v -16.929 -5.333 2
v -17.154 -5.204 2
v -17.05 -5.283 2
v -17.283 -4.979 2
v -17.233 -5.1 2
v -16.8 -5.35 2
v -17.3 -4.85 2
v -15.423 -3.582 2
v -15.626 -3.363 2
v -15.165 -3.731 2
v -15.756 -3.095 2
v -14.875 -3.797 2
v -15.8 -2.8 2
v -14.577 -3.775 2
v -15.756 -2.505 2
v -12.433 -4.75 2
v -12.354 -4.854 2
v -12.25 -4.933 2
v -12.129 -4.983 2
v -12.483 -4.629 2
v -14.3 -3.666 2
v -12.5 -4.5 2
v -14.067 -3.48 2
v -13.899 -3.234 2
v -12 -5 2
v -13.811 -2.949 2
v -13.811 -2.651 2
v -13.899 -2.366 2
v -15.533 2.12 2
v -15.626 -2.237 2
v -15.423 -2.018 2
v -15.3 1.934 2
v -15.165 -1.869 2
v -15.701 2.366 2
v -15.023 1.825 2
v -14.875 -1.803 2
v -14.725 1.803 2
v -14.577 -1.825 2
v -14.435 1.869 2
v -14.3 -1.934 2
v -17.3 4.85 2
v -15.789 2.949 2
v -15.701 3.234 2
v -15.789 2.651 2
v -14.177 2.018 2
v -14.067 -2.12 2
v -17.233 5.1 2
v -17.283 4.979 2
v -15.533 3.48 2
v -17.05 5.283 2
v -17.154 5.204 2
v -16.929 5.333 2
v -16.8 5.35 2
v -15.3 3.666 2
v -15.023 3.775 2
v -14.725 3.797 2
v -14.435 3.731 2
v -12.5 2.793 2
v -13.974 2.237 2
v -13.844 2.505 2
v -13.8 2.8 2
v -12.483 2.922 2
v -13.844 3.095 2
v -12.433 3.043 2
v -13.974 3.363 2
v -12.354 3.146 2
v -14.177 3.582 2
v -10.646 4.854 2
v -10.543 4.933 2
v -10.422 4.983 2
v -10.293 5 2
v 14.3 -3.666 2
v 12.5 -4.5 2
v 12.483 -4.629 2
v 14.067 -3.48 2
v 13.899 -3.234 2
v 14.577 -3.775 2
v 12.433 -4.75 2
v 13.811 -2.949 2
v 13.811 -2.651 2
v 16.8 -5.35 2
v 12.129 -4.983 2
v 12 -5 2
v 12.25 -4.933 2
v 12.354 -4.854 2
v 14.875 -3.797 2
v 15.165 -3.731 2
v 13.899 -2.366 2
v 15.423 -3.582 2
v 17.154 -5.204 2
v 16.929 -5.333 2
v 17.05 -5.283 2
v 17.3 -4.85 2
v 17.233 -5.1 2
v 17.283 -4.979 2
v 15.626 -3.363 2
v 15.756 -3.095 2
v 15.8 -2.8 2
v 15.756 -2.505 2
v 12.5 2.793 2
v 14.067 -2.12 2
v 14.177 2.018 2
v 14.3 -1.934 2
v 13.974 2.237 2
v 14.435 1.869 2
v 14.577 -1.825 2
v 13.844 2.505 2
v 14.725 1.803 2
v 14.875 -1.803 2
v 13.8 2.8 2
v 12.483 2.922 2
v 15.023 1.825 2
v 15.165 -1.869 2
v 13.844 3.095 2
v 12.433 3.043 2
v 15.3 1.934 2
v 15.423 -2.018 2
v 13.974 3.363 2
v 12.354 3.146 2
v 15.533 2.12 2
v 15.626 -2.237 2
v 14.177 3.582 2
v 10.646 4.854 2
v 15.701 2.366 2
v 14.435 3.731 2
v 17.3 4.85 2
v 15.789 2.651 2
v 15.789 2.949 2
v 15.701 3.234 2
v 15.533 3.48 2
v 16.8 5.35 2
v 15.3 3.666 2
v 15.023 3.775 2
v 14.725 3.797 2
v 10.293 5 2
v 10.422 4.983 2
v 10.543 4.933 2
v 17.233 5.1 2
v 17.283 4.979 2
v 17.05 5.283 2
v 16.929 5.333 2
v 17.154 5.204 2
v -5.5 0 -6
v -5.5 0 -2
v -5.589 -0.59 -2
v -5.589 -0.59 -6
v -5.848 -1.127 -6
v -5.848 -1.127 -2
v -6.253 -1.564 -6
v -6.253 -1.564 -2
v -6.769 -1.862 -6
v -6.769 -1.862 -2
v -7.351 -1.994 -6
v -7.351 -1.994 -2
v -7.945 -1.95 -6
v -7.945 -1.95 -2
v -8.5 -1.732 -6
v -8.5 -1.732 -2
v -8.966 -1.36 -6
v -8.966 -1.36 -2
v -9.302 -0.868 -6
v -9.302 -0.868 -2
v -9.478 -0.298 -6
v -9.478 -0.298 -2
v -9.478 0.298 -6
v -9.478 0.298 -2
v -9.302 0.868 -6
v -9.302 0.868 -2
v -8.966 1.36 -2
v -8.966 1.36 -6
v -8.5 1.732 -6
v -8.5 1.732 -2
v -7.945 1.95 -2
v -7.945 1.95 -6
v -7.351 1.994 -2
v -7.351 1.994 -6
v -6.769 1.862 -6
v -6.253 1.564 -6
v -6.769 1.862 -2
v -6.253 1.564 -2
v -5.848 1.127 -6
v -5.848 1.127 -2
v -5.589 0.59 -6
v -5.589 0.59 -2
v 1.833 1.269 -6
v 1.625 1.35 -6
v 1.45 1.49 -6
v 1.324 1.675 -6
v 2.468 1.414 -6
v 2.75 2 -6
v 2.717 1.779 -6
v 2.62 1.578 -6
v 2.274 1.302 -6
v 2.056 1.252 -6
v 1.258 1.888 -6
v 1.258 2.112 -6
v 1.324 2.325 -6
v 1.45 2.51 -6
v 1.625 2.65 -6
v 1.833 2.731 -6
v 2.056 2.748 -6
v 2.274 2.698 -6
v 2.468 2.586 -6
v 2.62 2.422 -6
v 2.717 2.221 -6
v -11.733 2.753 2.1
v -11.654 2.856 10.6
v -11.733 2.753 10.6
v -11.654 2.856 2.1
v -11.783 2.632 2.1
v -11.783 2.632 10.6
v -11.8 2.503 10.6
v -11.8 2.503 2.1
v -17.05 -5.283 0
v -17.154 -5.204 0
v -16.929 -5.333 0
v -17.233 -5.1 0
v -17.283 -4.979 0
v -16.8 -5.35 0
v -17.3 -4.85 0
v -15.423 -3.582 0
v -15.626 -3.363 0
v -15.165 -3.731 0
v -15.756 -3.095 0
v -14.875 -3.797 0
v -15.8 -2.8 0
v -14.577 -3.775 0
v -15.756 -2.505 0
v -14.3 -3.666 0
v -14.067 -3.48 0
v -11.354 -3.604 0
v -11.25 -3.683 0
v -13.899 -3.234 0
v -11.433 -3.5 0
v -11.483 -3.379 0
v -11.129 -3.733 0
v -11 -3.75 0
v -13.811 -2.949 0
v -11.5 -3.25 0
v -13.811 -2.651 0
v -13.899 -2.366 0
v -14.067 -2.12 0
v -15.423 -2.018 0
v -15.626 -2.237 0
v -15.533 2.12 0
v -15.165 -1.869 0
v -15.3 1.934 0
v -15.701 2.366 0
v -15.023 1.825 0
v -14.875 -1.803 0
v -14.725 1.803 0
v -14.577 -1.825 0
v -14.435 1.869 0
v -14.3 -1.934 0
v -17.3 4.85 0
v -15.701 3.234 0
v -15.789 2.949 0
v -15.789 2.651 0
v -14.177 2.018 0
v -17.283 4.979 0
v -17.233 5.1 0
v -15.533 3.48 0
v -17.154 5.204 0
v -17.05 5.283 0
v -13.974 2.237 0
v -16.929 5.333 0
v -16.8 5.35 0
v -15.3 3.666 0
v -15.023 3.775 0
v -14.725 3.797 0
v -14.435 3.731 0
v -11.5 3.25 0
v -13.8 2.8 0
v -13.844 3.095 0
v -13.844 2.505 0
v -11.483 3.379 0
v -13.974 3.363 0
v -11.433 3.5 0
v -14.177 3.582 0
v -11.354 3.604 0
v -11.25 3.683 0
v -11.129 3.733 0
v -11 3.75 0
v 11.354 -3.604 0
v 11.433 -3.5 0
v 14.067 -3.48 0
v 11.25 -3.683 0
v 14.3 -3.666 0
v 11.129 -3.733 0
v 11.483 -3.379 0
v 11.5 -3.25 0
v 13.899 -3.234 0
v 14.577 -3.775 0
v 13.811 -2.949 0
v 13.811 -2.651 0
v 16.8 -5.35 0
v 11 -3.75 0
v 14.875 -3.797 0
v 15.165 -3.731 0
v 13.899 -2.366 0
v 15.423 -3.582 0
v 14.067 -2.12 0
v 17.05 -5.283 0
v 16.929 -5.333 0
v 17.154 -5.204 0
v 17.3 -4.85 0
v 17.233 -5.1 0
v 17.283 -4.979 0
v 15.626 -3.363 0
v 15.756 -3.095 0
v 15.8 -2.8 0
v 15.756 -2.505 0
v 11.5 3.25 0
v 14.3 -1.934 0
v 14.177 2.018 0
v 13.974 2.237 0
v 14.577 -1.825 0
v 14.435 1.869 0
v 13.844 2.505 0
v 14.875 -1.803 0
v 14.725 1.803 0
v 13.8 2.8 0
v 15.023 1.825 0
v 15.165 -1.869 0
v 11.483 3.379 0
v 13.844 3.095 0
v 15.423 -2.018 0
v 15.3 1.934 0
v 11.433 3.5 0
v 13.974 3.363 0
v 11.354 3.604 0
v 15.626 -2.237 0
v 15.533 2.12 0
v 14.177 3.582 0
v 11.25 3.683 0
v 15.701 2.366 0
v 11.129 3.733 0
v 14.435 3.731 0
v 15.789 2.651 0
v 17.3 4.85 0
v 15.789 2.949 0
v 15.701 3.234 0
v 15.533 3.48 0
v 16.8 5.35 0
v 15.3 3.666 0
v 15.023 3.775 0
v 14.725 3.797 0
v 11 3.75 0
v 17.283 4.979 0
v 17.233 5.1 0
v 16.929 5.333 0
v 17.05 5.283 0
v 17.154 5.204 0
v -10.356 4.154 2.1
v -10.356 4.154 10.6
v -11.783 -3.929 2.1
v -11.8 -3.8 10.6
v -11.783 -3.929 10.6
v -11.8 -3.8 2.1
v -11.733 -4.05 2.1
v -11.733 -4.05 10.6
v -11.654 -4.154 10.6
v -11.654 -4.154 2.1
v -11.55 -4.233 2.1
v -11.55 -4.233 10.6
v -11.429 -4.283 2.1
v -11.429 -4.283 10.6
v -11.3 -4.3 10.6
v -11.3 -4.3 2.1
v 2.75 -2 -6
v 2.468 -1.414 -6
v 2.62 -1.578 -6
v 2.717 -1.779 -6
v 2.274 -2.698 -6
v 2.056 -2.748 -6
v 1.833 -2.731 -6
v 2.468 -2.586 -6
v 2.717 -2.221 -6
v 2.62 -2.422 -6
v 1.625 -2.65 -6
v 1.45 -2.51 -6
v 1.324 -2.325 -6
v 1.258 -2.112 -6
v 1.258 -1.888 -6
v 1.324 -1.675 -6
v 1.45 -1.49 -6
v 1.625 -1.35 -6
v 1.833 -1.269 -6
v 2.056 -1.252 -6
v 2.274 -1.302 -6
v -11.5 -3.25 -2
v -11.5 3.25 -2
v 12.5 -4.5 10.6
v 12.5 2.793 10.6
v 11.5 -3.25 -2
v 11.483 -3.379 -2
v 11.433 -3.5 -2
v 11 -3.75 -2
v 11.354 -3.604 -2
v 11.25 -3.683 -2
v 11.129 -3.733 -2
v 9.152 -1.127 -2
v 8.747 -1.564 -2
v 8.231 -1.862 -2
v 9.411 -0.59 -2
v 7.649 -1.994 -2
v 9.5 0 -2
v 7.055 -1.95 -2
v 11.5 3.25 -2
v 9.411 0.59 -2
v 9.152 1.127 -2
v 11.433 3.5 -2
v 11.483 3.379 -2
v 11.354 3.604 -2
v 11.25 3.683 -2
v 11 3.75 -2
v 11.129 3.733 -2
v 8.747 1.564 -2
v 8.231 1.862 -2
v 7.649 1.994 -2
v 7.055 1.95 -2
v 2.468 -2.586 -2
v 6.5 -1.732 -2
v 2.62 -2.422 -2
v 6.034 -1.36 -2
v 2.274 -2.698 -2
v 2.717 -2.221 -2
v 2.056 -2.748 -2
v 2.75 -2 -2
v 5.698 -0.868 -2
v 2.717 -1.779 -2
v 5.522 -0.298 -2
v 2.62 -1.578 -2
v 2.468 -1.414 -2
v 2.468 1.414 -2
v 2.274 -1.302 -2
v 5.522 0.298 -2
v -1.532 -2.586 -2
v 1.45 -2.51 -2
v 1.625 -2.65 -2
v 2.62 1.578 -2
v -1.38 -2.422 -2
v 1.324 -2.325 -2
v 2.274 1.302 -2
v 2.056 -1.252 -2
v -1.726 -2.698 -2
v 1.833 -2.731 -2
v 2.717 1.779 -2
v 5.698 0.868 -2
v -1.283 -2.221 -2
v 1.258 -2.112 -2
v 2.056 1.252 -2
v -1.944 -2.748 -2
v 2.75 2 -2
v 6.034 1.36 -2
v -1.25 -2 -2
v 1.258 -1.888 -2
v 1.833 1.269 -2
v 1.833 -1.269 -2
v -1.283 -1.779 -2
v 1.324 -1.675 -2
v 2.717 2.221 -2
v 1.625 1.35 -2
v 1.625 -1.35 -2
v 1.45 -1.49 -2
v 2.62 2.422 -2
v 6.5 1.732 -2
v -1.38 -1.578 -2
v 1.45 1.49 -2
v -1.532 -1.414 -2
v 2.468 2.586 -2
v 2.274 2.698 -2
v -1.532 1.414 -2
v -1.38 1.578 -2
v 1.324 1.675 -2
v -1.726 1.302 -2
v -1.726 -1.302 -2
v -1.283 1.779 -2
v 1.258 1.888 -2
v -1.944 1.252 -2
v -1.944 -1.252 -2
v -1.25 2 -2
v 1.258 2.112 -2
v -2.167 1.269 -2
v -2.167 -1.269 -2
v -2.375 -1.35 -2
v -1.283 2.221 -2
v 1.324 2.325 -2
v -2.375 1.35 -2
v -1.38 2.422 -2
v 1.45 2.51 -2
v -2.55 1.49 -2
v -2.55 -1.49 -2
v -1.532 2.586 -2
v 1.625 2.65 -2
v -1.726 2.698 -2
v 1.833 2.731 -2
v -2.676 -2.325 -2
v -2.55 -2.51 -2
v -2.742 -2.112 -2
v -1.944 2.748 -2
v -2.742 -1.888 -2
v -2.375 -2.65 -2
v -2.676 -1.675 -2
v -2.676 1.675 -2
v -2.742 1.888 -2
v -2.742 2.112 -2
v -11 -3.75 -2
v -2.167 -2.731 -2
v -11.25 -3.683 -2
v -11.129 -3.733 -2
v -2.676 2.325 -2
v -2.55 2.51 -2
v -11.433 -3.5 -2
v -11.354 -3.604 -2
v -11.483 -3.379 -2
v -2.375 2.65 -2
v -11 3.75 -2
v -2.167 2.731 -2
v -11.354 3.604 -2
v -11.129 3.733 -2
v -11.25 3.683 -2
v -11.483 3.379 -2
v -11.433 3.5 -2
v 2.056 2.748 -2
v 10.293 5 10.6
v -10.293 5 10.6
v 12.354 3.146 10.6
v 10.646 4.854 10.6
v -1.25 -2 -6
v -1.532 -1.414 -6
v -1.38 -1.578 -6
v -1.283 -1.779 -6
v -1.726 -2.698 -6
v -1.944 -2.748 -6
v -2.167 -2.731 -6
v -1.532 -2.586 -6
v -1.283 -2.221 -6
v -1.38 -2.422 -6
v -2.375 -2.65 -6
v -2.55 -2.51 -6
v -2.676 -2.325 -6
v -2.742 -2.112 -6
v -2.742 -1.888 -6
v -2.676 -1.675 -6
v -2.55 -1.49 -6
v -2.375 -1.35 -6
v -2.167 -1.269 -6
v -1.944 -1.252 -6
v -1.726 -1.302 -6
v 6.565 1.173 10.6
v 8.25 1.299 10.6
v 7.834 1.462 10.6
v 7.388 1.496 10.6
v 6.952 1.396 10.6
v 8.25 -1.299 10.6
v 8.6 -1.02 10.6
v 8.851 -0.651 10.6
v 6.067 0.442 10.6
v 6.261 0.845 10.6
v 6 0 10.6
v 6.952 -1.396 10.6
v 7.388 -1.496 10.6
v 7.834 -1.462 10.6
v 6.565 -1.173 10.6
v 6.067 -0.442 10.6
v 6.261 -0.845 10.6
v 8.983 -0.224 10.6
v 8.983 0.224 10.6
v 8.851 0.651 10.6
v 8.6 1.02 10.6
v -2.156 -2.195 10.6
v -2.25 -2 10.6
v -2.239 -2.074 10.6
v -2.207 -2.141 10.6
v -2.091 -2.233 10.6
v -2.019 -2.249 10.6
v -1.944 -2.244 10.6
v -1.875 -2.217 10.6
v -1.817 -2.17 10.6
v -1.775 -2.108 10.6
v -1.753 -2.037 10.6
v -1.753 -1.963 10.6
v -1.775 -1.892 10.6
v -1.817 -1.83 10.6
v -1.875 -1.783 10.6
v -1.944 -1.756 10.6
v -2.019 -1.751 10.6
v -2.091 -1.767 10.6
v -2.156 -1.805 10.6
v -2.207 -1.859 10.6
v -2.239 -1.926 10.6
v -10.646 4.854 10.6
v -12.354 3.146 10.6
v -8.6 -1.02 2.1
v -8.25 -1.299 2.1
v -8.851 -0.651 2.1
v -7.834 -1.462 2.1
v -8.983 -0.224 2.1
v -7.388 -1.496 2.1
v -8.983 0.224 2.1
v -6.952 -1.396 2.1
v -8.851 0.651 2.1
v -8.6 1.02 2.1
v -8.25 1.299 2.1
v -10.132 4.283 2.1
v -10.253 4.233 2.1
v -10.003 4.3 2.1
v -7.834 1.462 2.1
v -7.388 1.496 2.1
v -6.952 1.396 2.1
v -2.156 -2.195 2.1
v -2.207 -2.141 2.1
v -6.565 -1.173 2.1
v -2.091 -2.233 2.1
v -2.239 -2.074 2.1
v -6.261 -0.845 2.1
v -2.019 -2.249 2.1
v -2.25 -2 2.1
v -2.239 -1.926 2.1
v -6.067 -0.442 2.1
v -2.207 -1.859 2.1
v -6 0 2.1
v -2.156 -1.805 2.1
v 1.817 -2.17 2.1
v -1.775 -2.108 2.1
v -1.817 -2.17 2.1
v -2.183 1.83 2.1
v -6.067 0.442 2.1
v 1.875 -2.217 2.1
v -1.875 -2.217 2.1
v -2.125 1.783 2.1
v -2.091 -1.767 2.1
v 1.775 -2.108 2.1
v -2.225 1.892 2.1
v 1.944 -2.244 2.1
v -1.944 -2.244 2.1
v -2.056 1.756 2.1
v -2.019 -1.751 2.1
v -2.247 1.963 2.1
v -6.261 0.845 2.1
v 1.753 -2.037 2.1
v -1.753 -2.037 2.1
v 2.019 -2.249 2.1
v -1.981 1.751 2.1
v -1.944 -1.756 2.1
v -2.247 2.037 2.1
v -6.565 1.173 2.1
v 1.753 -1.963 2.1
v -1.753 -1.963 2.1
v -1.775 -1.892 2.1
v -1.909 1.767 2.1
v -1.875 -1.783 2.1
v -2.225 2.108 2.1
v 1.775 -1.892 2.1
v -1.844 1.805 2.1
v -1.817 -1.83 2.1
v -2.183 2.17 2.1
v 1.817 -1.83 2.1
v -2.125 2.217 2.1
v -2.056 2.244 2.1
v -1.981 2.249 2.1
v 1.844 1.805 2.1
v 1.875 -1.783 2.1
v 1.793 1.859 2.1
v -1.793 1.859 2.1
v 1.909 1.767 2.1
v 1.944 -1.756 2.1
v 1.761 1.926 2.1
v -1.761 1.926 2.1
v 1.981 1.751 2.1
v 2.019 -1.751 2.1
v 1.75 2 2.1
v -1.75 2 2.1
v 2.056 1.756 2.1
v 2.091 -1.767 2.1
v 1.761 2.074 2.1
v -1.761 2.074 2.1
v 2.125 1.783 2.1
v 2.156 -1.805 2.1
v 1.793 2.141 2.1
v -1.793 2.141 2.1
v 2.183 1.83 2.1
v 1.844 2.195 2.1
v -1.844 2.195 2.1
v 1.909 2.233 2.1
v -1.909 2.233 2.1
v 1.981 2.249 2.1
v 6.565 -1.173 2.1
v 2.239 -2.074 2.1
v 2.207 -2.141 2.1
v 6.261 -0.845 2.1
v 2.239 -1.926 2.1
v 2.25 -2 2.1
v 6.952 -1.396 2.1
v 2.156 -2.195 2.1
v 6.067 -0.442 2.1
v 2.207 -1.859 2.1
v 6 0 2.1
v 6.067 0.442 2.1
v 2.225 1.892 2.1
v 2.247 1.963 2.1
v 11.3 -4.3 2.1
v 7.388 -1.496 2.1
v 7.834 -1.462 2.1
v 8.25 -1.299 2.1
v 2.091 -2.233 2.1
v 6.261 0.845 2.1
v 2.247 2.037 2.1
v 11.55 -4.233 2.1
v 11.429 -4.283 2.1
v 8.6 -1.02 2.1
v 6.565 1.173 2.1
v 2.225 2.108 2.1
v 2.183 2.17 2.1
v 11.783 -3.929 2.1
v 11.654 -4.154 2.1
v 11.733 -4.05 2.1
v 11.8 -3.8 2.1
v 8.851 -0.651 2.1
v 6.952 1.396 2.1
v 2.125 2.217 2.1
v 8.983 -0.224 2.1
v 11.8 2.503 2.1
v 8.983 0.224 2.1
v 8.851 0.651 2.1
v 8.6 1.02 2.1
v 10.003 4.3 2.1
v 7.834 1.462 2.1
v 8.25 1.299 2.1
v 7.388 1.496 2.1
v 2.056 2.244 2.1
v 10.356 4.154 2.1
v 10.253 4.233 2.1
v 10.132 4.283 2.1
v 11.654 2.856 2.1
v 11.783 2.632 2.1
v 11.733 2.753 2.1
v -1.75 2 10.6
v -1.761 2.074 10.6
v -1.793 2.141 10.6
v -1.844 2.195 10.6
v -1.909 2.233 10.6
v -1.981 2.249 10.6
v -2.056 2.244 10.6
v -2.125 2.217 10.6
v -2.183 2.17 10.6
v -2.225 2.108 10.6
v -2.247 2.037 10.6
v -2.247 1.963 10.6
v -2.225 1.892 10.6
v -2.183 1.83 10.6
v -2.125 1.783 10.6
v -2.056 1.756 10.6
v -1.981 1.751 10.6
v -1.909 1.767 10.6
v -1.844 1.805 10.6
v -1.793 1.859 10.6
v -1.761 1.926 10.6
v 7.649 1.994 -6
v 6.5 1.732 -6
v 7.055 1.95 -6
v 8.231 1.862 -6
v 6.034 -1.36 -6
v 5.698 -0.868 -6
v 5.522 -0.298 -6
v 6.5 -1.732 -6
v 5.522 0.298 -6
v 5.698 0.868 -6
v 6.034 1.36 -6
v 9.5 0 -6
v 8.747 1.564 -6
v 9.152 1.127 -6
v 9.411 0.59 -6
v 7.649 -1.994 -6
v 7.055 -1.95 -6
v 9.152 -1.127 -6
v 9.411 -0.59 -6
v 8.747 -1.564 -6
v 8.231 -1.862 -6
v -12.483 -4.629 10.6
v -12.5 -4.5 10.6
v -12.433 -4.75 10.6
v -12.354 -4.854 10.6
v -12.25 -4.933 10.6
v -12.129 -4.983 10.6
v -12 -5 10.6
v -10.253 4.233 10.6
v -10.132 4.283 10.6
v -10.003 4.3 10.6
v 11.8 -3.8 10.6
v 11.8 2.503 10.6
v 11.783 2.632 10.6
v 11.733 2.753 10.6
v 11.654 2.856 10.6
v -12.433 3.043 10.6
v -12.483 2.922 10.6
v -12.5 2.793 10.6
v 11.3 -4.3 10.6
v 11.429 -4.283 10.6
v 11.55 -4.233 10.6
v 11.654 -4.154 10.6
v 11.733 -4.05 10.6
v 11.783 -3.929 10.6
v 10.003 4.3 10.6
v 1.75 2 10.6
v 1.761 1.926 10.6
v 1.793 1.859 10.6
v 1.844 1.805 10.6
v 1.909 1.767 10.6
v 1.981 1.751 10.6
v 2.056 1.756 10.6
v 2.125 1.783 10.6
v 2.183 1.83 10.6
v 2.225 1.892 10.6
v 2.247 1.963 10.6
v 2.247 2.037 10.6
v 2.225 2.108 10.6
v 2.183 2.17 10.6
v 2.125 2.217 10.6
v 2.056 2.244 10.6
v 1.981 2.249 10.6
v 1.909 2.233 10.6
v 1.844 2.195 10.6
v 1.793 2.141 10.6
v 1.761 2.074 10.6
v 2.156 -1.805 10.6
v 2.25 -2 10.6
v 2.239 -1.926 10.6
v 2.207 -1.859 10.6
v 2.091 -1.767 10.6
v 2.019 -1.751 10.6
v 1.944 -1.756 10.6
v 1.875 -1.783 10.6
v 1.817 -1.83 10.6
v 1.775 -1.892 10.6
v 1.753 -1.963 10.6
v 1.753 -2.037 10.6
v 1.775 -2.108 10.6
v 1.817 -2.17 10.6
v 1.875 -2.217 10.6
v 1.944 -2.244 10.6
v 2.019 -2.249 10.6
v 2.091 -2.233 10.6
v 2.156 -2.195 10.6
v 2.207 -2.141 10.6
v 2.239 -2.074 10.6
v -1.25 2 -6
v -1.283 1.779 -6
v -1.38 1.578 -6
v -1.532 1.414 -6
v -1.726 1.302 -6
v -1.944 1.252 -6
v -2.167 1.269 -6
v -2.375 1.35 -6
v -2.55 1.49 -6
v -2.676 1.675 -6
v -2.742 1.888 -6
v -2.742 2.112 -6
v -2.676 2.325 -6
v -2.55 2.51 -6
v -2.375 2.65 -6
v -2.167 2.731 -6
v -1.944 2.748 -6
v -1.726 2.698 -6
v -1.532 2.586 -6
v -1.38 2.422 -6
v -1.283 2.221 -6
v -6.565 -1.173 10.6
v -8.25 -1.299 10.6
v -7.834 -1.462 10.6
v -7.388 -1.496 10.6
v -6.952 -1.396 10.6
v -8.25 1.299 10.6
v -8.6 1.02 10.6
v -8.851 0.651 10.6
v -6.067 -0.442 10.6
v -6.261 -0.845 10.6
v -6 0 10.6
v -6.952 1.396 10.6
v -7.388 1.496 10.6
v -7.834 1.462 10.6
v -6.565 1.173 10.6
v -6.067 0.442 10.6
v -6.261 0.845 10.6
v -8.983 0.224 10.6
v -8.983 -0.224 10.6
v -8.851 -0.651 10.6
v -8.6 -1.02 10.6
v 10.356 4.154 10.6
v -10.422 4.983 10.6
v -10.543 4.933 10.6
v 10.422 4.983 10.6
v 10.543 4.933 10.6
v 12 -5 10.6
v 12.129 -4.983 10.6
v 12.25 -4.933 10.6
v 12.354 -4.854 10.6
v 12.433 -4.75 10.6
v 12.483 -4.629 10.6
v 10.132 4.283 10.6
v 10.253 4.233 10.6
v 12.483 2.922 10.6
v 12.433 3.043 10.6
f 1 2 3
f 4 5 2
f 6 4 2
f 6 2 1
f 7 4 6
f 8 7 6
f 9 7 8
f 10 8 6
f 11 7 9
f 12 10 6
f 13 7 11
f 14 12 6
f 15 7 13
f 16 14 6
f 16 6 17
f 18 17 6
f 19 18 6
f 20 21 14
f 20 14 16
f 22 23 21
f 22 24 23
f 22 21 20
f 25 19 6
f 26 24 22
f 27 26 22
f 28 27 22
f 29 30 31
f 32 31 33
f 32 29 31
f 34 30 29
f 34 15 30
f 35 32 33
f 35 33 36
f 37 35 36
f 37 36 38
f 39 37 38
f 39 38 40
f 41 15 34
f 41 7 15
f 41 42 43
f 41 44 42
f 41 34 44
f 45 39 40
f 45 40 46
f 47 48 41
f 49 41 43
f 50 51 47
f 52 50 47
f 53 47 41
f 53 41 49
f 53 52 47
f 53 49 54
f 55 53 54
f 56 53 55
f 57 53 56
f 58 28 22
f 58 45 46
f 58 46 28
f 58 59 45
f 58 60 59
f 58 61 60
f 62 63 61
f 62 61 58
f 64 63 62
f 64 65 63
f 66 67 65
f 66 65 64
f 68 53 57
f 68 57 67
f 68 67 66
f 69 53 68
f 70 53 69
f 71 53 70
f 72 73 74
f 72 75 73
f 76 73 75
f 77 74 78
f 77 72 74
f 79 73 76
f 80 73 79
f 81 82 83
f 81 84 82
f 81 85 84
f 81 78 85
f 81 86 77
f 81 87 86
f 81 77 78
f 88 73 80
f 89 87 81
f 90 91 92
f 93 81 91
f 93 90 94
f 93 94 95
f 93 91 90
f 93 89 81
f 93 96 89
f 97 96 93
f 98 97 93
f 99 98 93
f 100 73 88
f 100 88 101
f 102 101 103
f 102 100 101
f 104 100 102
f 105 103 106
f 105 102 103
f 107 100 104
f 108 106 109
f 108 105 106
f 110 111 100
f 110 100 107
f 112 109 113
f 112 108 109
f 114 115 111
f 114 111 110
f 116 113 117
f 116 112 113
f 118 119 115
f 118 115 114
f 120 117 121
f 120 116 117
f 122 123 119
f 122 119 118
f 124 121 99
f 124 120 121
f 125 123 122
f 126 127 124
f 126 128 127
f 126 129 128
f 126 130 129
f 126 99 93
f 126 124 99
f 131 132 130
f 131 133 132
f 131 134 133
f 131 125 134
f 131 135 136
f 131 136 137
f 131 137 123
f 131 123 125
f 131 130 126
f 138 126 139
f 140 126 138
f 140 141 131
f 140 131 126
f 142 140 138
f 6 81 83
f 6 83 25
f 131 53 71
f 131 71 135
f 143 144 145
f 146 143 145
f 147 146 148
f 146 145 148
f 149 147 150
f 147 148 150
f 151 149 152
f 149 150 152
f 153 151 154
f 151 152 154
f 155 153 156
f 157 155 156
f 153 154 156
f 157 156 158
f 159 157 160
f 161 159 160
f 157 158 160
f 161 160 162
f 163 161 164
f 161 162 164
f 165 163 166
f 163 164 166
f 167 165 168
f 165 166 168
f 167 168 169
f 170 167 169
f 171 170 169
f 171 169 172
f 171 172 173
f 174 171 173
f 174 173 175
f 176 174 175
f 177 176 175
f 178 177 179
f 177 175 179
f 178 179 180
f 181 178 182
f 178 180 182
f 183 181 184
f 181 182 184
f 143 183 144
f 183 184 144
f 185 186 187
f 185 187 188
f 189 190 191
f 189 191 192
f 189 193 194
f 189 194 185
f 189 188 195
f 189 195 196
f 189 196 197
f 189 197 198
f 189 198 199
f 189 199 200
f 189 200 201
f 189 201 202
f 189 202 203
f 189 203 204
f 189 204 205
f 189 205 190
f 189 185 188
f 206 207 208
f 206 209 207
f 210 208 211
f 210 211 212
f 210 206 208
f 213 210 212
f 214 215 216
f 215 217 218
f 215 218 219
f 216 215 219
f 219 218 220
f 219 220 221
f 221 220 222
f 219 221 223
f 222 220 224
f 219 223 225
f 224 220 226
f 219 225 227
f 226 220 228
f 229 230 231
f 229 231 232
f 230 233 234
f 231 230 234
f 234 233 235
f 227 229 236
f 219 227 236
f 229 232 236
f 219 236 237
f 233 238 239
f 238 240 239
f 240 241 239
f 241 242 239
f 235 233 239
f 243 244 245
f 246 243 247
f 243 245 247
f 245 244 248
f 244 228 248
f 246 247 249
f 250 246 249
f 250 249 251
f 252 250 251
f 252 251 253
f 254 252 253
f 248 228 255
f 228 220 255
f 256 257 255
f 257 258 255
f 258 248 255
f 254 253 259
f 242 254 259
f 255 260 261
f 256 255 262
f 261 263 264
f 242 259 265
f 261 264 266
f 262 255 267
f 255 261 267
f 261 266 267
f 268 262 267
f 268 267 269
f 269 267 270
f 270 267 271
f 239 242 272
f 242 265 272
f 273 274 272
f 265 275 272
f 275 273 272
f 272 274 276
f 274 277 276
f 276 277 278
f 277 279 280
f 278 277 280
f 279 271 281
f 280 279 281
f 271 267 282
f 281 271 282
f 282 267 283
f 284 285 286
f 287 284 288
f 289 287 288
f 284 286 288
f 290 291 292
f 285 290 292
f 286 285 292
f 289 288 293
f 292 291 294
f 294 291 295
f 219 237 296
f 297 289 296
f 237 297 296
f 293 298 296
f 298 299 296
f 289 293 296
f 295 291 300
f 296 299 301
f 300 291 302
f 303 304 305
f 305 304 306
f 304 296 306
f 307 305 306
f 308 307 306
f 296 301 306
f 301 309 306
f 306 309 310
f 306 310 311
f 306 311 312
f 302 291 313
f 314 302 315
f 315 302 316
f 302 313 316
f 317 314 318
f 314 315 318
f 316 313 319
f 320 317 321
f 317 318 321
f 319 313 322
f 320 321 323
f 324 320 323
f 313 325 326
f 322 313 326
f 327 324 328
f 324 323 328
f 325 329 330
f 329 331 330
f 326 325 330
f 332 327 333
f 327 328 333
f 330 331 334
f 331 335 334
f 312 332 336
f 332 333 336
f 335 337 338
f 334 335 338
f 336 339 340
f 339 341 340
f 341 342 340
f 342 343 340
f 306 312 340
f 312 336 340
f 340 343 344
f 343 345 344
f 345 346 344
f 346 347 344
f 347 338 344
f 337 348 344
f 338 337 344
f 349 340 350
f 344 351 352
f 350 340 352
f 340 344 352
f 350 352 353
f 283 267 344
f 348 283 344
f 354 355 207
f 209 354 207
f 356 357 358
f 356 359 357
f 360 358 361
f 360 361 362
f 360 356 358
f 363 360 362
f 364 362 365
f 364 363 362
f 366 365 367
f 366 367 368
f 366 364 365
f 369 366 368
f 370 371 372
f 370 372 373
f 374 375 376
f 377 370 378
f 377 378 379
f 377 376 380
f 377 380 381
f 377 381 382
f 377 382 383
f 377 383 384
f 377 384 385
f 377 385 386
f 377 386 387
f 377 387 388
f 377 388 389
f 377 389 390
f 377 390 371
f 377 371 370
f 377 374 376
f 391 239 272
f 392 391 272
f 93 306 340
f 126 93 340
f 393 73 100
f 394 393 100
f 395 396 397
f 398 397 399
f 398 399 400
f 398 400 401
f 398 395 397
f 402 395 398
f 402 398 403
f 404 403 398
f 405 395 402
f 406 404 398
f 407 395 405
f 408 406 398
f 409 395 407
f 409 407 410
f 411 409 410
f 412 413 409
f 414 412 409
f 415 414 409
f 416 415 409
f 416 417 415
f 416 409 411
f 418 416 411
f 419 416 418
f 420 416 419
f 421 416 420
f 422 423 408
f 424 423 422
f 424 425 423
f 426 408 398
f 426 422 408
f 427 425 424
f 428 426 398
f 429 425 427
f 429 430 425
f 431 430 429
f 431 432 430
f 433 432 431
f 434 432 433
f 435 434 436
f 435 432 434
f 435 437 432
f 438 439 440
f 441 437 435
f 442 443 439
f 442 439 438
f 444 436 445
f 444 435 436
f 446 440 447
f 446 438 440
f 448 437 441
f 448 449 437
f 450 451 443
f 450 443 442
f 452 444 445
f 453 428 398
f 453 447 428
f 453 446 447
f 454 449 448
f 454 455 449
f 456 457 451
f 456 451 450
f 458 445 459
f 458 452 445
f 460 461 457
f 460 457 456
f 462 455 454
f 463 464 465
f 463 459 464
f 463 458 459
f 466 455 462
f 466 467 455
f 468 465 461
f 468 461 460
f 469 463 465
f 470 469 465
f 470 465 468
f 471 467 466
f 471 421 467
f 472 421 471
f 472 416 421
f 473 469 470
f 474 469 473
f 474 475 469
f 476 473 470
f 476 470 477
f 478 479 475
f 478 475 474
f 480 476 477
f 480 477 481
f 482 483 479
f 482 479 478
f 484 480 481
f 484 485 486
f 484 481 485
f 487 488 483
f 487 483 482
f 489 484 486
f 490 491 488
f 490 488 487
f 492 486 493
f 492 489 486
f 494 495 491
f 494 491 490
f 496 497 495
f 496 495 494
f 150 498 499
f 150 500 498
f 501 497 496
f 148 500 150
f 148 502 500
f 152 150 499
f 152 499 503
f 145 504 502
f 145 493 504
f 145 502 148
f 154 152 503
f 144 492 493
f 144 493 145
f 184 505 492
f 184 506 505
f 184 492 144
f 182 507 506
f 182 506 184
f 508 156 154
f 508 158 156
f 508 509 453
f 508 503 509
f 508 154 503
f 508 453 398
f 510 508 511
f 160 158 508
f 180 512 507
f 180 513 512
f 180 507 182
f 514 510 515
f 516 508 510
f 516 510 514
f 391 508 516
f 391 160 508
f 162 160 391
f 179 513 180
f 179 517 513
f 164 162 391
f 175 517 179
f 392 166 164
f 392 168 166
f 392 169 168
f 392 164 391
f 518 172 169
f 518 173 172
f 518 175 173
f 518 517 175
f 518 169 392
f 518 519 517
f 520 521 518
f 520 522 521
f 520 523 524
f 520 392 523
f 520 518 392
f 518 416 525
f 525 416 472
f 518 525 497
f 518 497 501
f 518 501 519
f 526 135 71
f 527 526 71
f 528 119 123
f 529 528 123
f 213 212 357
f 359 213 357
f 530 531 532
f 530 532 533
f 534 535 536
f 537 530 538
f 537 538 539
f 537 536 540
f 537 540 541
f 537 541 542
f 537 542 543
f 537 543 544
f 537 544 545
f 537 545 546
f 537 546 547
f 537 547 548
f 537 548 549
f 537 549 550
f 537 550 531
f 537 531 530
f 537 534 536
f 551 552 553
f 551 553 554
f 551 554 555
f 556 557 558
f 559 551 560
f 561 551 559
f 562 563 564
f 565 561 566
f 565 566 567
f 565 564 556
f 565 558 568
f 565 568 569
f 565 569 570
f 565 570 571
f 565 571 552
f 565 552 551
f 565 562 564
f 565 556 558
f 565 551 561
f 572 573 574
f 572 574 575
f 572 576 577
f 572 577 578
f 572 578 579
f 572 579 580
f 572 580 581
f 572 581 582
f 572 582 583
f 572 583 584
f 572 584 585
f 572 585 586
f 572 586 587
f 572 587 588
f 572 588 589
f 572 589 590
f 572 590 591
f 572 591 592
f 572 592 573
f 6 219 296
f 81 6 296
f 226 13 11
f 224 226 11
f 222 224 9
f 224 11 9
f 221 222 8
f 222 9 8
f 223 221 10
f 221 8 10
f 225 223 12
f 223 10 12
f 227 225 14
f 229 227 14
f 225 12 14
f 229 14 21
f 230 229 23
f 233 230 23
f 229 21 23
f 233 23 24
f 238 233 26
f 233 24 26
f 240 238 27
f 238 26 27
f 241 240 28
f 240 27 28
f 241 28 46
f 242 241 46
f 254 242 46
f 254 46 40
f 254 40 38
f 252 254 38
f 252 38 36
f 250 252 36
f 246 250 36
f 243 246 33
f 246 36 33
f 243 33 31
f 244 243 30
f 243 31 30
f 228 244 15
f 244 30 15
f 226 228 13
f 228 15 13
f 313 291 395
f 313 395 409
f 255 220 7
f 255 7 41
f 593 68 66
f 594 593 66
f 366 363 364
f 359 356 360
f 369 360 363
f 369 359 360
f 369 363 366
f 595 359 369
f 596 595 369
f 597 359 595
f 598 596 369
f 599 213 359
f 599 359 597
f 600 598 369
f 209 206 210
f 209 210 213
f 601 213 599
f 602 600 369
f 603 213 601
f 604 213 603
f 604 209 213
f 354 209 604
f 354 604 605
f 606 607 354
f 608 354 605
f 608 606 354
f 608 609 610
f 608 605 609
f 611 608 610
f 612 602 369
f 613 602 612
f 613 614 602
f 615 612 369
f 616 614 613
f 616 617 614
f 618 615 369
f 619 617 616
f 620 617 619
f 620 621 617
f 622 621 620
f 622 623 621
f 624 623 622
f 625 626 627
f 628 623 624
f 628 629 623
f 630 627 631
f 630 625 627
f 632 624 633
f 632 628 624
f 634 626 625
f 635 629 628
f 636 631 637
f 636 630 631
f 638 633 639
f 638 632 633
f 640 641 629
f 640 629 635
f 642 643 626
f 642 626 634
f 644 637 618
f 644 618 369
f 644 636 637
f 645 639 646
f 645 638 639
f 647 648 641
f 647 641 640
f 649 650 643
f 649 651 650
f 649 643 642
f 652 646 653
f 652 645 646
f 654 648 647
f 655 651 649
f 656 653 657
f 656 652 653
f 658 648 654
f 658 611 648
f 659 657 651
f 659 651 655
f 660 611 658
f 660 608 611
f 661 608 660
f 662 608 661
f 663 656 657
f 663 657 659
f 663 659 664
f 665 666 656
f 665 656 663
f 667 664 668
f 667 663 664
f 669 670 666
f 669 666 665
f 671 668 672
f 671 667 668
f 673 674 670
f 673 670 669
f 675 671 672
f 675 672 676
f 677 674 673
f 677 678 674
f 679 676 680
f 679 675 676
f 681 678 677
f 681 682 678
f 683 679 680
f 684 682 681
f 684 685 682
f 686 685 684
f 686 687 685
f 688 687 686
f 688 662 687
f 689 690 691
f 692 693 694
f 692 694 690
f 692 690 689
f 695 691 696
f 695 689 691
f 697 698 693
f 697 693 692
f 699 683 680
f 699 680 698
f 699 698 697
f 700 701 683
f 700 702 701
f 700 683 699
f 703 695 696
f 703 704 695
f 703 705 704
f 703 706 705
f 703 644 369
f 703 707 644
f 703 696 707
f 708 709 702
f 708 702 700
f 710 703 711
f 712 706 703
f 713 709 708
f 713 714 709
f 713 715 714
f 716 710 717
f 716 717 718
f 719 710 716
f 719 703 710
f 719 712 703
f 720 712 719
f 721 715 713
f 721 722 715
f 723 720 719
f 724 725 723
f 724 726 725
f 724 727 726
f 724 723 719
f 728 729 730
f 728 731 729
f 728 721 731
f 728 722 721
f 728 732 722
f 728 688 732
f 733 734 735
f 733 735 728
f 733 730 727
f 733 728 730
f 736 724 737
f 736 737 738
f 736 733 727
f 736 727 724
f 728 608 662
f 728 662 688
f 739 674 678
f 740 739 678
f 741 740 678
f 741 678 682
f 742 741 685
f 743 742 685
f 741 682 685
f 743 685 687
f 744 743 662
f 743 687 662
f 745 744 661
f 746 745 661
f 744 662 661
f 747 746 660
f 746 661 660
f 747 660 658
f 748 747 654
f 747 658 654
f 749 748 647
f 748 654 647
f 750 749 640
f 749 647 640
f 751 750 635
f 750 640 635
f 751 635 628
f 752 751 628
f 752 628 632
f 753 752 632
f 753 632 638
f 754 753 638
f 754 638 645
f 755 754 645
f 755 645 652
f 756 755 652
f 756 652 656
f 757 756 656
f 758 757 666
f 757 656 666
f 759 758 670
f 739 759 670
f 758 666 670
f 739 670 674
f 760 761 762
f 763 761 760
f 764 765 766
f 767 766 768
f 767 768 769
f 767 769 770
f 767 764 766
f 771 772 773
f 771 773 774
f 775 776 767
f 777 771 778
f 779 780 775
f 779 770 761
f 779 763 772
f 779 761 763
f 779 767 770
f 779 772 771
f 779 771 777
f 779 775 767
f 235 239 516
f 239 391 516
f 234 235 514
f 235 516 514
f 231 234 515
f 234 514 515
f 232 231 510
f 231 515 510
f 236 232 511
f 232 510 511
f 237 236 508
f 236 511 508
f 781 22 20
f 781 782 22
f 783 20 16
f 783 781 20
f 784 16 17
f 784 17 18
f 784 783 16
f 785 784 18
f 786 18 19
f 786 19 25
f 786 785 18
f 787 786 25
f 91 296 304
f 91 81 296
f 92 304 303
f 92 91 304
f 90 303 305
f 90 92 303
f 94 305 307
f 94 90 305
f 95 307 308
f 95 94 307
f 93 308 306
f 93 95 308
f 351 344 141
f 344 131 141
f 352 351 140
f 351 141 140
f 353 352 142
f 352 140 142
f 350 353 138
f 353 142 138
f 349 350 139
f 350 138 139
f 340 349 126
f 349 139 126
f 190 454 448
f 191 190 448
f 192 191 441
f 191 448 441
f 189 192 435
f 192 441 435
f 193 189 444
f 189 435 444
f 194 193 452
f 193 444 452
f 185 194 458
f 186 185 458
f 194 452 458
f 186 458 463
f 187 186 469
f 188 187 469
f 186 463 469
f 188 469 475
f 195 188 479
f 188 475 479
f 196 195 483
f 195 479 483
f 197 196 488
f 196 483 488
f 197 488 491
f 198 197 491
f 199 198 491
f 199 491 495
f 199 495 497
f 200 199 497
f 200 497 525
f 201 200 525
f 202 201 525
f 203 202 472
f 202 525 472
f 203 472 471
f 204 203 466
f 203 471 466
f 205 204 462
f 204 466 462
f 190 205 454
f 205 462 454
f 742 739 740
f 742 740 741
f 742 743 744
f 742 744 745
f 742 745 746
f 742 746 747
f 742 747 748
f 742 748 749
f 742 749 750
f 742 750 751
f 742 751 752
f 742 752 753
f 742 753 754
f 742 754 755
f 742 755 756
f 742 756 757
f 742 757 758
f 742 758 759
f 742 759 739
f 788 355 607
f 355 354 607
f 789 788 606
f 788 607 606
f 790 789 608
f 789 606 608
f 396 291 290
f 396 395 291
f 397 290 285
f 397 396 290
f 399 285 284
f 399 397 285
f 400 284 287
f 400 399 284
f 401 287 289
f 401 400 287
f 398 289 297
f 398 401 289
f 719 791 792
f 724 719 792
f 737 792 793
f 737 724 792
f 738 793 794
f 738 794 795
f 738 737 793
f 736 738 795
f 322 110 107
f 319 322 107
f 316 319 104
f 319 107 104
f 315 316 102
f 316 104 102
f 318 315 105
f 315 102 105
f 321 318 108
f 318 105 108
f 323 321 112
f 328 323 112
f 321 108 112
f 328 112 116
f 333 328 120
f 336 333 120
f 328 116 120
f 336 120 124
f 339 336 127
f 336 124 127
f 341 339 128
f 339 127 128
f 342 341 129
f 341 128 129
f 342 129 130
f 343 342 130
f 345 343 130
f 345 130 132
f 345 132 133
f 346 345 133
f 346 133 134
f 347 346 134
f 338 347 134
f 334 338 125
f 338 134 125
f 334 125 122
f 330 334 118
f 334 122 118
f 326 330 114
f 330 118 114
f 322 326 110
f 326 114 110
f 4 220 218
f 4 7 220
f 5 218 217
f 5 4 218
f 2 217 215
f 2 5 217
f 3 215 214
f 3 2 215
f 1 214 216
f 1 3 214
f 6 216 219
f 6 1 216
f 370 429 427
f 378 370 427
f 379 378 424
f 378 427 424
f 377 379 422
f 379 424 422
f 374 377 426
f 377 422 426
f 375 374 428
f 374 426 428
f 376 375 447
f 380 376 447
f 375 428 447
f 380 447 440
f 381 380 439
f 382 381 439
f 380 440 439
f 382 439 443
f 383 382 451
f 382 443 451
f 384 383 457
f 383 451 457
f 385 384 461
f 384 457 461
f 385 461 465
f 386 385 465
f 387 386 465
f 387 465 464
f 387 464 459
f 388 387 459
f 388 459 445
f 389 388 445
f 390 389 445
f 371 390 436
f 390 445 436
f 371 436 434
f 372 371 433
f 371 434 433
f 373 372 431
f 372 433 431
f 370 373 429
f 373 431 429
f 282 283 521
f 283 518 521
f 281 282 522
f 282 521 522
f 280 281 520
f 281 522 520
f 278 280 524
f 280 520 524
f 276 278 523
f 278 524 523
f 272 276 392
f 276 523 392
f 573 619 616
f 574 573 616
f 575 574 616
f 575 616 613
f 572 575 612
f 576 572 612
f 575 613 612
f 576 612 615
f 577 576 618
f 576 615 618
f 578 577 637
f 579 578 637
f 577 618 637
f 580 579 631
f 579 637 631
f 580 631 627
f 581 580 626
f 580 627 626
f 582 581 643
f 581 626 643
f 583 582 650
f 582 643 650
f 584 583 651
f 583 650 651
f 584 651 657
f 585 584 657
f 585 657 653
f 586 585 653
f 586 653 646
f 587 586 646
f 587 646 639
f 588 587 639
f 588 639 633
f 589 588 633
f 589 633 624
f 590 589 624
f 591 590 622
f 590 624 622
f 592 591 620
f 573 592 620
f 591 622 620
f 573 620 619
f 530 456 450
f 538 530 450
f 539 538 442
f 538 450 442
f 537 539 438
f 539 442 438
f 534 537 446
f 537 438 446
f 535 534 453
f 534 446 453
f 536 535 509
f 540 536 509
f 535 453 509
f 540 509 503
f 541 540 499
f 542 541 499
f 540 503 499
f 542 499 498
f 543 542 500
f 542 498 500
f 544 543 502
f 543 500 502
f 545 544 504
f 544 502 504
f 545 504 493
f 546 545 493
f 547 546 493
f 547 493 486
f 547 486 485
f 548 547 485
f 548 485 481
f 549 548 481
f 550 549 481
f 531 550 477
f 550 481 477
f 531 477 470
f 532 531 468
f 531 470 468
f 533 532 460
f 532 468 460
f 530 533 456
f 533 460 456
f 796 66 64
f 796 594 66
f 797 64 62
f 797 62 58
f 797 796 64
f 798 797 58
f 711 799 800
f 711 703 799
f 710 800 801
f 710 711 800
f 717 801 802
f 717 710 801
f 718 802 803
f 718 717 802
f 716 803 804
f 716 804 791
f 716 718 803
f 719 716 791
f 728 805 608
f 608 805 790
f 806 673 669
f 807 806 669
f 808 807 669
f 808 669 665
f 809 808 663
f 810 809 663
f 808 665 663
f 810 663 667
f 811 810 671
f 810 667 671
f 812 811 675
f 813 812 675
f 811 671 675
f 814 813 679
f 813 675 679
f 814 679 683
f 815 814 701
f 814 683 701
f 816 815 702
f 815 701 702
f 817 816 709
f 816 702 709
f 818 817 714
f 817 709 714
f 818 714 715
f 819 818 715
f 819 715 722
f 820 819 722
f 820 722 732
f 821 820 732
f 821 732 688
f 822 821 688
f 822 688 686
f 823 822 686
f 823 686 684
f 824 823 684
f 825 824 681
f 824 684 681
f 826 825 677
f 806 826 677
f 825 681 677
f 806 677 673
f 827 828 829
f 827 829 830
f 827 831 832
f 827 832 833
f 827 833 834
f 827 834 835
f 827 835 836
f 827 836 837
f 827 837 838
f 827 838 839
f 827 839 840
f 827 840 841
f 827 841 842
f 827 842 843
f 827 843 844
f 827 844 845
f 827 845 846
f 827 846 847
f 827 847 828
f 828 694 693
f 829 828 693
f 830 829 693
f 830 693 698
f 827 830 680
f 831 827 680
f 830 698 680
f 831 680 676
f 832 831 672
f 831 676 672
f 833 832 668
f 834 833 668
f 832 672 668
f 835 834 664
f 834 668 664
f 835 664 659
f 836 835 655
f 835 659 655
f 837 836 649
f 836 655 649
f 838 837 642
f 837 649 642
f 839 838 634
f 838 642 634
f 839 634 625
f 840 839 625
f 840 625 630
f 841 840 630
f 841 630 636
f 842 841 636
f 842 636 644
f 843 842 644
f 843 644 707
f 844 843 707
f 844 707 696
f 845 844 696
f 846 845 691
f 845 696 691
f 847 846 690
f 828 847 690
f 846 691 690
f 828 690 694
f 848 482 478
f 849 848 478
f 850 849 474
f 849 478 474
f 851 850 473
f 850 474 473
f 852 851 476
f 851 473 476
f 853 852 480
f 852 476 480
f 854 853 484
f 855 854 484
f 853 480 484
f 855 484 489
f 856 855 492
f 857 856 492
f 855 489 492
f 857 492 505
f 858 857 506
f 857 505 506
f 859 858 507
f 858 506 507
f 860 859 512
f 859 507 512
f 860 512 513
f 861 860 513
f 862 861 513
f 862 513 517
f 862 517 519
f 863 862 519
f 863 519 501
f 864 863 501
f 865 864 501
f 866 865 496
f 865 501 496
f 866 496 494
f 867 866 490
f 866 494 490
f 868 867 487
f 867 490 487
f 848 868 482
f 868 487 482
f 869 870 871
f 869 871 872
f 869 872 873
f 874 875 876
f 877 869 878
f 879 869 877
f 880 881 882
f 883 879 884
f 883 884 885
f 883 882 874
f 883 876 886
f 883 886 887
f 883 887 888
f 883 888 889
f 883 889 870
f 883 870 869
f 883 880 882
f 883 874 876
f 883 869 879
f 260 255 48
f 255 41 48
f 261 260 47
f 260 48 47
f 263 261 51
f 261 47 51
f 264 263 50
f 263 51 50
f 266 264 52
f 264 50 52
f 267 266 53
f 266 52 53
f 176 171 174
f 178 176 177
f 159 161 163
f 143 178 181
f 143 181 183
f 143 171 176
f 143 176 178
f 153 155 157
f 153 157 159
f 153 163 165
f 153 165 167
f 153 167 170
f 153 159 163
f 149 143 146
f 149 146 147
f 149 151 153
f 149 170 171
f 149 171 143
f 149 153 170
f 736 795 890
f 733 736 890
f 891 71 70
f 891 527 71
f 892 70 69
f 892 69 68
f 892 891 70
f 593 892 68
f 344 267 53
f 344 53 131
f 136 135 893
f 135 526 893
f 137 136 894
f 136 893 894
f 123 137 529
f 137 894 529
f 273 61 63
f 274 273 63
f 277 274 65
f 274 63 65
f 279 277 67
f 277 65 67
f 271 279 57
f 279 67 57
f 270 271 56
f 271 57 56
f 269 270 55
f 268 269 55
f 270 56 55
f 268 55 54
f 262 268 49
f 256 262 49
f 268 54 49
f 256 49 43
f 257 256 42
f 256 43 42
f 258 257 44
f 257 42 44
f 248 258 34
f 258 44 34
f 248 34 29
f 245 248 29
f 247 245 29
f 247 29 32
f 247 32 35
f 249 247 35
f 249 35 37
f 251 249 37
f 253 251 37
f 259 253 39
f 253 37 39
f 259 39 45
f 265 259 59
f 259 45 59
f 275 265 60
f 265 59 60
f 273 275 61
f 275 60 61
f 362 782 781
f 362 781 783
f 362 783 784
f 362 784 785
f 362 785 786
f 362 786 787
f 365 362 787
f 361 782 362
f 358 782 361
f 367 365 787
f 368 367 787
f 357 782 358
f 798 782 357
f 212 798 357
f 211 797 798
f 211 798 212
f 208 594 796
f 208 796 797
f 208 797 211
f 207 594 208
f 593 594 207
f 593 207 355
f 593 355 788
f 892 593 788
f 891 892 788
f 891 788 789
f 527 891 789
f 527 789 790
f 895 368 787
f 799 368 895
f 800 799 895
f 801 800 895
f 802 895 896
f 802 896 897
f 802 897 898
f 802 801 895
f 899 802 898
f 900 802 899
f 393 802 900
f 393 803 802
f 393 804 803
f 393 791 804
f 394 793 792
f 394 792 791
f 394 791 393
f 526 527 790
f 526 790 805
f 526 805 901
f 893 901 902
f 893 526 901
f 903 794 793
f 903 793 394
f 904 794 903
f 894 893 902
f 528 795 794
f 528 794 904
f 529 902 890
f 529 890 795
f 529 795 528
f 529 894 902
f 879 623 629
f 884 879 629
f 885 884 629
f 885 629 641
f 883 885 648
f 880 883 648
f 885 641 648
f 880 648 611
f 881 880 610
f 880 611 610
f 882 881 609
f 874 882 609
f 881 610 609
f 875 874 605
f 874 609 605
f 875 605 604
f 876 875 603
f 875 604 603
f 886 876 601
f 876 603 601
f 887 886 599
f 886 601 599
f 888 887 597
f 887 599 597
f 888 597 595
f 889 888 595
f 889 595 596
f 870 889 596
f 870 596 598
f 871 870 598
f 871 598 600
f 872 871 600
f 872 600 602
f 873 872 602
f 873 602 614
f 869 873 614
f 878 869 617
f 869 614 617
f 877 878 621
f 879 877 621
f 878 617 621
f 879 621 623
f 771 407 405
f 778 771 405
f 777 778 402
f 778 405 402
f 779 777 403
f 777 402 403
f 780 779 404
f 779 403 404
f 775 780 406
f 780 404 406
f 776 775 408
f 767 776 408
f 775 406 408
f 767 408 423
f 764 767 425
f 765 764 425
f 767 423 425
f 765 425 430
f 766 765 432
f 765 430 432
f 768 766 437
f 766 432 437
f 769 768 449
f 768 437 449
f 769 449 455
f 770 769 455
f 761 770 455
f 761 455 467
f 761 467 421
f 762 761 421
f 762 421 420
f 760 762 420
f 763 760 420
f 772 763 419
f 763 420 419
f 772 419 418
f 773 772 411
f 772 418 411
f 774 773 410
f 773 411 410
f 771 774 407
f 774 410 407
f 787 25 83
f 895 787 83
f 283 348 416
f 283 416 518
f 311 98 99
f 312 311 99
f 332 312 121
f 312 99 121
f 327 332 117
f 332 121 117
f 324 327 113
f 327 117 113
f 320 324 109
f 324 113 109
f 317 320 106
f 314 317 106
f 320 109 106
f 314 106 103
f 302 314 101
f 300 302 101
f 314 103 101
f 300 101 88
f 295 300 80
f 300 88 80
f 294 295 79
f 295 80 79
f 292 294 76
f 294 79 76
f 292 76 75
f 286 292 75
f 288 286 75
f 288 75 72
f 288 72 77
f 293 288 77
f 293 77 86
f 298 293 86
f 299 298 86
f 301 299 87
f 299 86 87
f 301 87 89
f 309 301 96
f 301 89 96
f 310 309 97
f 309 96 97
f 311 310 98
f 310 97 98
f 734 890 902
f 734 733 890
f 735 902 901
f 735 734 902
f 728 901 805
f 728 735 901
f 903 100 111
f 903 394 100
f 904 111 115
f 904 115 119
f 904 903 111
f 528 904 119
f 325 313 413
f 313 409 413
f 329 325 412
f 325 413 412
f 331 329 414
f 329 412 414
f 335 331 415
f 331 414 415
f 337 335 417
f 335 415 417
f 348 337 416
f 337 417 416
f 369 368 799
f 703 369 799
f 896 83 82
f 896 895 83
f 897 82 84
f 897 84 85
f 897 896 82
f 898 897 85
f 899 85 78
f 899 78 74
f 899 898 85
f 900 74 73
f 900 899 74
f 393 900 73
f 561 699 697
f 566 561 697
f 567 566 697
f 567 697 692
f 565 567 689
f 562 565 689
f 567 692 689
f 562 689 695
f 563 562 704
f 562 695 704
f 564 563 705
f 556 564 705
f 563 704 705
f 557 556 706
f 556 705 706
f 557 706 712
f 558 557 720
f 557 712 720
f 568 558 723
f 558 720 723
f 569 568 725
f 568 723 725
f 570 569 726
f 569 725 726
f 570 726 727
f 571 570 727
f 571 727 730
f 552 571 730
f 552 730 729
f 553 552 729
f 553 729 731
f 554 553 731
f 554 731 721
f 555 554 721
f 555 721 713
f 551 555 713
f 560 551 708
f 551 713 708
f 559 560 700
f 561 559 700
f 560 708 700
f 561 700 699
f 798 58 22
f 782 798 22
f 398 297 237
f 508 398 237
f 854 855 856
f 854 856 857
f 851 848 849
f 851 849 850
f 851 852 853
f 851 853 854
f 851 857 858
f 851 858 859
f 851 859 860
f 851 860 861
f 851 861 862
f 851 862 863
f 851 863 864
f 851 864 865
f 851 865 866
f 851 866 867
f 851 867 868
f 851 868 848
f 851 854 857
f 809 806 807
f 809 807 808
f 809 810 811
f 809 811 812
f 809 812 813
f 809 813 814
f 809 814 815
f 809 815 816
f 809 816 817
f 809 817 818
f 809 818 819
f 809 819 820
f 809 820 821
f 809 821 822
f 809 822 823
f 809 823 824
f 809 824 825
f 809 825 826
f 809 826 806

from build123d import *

# Parameters (mm, degrees)
SKETCH_1_W          = 34.6
SKETCH_1_H          = 10.7
EXTRUDE_1_DEPTH     = 2
SKETCH_2_R          = 1
CUT_EXTRUDE_1_DEPTH = 2
EXTRUDE_2_DEPTH     = 8.6
CUT_EXTRUDE_2_DEPTH = 8.5
SKETCH_5_R          = 1.5
SKETCH_5_R_2        = 0.25
EXTRUDE_3_DEPTH     = 8.5
SKETCH_6_W          = 23
SKETCH_6_H          = 7.5
EXTRUDE_4_DEPTH     = 2
SKETCH_7_R          = 2
SKETCH_7_R_2        = 0.75
EXTRUDE_5_DEPTH     = 4
FILLET_2_R          = 0.5


with BuildPart() as part:
    # 草图1 → 凸台-拉伸1 (new body)
    with BuildSketch(Plane.XY):
        Rectangle(SKETCH_1_W, SKETCH_1_H)
    extrude(amount=EXTRUDE_1_DEPTH)

    # 草图2 → 切除-拉伸1 (cut)
    with BuildSketch(Plane.XY.offset(2)):
        with Locations((-14.8, 2.8)):
            Circle(SKETCH_2_R)
        with Locations(Location((14.8, 2.8, 0), (0, 0, 180))):
            Circle(SKETCH_2_R)
        with Locations((14.8, -2.8)):
            Circle(SKETCH_2_R)
        with Locations(Location((-14.8, -2.8, 0), (0, 0, 180))):
            Circle(SKETCH_2_R)
    extrude(amount=-CUT_EXTRUDE_1_DEPTH, mode=Mode.SUBTRACT)

    # 草图3 → 凸台-拉伸2 (add)
    with BuildSketch(Plane.XY.offset(2)):
        Polygon((10.5, 5), (-10.5, 5), (-12.5, 3), (-12.5, -5), (12.5, -5), (12.5, 3), align=None)
    extrude(amount=EXTRUDE_2_DEPTH)

    # 草图4 → 切除-拉伸2 (cut)
    with BuildSketch(Plane.XY.offset(10.6)):
        Polygon((-10.210050506, 4.3), (-11.8, 2.710050506), (-11.8, -4.3), (11.8, -4.3), (11.8, 2.710050506), (10.210050506, 4.3), align=None)
    extrude(amount=-CUT_EXTRUDE_2_DEPTH, mode=Mode.SUBTRACT)

    # 草图5 → 凸台-拉伸3 (add)
    with BuildSketch(Plane.XY.offset(2.1)):
        with Locations((-7.5, 0)):
            Circle(SKETCH_5_R)
        with Locations((-2, 2)):
            Circle(SKETCH_5_R_2)
        with Locations(Location((2, 2, 0), (0, 0, 180))):
            Circle(SKETCH_5_R_2)
        with Locations(Location((7.5, 0, 0), (0, 0, 180))):
            Circle(SKETCH_5_R)
        with Locations((2, -2)):
            Circle(SKETCH_5_R_2)
        with Locations(Location((-2, -2, 0), (0, 0, 180))):
            Circle(SKETCH_5_R_2)
    extrude(amount=EXTRUDE_3_DEPTH)

    # 草图6 → 凸台-拉伸4 (add)
    with BuildSketch(Plane(origin=(0, 0, 0), x_dir=(-1, 0, 0), z_dir=(0, 0, -1))):
        Rectangle(SKETCH_6_W, SKETCH_6_H)
    extrude(amount=EXTRUDE_4_DEPTH)

    # 草图7 → 凸台-拉伸5 (add)
    with BuildSketch(Plane(origin=(0, 0, -2), x_dir=(-1, 0, 0), z_dir=(0, 0, -1))):
        with Locations(Location((-7.5, 0, 0), (0, 0, 180))):
            Circle(SKETCH_7_R)
        with Locations(Location((-2, 2, 0), (0, 0, 180))):
            Circle(SKETCH_7_R_2)
        with Locations(Location((2, 2, 0), (0, 0, 180))):
            Circle(SKETCH_7_R_2)
        with Locations(Location((7.5, 0, 0), (0, 0, 180))):
            Circle(SKETCH_7_R)
        with Locations(Location((2, -2, 0), (0, 0, 180))):
            Circle(SKETCH_7_R_2)
        with Locations(Location((-2, -2, 0), (0, 0, 180))):
            Circle(SKETCH_7_R_2)
    extrude(amount=EXTRUDE_5_DEPTH)

    # 圆角2
    fillet_2_edges = [part.edges().sort_by_distance(p)[0] for p in [
        (-10.5, 5, 6.3),
        (-12.5, 3, 6.3),
        (-12.5, -5, 6.3),
        (12.5, -5, 6.3),
        (12.5, 3, 6.3),
        (10.5, 5, 6.3),
        (-10.210050506, 4.3, 6.35),
        (10.210050506, 4.3, 6.35),
        (11.8, 2.710050506, 6.35),
        (11.8, -4.3, 6.35),
        (-11.8, -4.3, 6.35),
        (-11.8, 2.710050506, 6.35),
        (17.3, -5.35, 1),
        (-17.3, -5.35, 1),
        (-17.3, 5.35, 1),
        (17.3, 5.35, 1),
        (-11.5, -3.75, -1),
        (-11.5, 3.75, -1),
        (11.5, 3.75, -1),
        (11.5, -3.75, -1),
    ]]
    fillet(fillet_2_edges, radius=FILLET_2_R)


solid = part.part
